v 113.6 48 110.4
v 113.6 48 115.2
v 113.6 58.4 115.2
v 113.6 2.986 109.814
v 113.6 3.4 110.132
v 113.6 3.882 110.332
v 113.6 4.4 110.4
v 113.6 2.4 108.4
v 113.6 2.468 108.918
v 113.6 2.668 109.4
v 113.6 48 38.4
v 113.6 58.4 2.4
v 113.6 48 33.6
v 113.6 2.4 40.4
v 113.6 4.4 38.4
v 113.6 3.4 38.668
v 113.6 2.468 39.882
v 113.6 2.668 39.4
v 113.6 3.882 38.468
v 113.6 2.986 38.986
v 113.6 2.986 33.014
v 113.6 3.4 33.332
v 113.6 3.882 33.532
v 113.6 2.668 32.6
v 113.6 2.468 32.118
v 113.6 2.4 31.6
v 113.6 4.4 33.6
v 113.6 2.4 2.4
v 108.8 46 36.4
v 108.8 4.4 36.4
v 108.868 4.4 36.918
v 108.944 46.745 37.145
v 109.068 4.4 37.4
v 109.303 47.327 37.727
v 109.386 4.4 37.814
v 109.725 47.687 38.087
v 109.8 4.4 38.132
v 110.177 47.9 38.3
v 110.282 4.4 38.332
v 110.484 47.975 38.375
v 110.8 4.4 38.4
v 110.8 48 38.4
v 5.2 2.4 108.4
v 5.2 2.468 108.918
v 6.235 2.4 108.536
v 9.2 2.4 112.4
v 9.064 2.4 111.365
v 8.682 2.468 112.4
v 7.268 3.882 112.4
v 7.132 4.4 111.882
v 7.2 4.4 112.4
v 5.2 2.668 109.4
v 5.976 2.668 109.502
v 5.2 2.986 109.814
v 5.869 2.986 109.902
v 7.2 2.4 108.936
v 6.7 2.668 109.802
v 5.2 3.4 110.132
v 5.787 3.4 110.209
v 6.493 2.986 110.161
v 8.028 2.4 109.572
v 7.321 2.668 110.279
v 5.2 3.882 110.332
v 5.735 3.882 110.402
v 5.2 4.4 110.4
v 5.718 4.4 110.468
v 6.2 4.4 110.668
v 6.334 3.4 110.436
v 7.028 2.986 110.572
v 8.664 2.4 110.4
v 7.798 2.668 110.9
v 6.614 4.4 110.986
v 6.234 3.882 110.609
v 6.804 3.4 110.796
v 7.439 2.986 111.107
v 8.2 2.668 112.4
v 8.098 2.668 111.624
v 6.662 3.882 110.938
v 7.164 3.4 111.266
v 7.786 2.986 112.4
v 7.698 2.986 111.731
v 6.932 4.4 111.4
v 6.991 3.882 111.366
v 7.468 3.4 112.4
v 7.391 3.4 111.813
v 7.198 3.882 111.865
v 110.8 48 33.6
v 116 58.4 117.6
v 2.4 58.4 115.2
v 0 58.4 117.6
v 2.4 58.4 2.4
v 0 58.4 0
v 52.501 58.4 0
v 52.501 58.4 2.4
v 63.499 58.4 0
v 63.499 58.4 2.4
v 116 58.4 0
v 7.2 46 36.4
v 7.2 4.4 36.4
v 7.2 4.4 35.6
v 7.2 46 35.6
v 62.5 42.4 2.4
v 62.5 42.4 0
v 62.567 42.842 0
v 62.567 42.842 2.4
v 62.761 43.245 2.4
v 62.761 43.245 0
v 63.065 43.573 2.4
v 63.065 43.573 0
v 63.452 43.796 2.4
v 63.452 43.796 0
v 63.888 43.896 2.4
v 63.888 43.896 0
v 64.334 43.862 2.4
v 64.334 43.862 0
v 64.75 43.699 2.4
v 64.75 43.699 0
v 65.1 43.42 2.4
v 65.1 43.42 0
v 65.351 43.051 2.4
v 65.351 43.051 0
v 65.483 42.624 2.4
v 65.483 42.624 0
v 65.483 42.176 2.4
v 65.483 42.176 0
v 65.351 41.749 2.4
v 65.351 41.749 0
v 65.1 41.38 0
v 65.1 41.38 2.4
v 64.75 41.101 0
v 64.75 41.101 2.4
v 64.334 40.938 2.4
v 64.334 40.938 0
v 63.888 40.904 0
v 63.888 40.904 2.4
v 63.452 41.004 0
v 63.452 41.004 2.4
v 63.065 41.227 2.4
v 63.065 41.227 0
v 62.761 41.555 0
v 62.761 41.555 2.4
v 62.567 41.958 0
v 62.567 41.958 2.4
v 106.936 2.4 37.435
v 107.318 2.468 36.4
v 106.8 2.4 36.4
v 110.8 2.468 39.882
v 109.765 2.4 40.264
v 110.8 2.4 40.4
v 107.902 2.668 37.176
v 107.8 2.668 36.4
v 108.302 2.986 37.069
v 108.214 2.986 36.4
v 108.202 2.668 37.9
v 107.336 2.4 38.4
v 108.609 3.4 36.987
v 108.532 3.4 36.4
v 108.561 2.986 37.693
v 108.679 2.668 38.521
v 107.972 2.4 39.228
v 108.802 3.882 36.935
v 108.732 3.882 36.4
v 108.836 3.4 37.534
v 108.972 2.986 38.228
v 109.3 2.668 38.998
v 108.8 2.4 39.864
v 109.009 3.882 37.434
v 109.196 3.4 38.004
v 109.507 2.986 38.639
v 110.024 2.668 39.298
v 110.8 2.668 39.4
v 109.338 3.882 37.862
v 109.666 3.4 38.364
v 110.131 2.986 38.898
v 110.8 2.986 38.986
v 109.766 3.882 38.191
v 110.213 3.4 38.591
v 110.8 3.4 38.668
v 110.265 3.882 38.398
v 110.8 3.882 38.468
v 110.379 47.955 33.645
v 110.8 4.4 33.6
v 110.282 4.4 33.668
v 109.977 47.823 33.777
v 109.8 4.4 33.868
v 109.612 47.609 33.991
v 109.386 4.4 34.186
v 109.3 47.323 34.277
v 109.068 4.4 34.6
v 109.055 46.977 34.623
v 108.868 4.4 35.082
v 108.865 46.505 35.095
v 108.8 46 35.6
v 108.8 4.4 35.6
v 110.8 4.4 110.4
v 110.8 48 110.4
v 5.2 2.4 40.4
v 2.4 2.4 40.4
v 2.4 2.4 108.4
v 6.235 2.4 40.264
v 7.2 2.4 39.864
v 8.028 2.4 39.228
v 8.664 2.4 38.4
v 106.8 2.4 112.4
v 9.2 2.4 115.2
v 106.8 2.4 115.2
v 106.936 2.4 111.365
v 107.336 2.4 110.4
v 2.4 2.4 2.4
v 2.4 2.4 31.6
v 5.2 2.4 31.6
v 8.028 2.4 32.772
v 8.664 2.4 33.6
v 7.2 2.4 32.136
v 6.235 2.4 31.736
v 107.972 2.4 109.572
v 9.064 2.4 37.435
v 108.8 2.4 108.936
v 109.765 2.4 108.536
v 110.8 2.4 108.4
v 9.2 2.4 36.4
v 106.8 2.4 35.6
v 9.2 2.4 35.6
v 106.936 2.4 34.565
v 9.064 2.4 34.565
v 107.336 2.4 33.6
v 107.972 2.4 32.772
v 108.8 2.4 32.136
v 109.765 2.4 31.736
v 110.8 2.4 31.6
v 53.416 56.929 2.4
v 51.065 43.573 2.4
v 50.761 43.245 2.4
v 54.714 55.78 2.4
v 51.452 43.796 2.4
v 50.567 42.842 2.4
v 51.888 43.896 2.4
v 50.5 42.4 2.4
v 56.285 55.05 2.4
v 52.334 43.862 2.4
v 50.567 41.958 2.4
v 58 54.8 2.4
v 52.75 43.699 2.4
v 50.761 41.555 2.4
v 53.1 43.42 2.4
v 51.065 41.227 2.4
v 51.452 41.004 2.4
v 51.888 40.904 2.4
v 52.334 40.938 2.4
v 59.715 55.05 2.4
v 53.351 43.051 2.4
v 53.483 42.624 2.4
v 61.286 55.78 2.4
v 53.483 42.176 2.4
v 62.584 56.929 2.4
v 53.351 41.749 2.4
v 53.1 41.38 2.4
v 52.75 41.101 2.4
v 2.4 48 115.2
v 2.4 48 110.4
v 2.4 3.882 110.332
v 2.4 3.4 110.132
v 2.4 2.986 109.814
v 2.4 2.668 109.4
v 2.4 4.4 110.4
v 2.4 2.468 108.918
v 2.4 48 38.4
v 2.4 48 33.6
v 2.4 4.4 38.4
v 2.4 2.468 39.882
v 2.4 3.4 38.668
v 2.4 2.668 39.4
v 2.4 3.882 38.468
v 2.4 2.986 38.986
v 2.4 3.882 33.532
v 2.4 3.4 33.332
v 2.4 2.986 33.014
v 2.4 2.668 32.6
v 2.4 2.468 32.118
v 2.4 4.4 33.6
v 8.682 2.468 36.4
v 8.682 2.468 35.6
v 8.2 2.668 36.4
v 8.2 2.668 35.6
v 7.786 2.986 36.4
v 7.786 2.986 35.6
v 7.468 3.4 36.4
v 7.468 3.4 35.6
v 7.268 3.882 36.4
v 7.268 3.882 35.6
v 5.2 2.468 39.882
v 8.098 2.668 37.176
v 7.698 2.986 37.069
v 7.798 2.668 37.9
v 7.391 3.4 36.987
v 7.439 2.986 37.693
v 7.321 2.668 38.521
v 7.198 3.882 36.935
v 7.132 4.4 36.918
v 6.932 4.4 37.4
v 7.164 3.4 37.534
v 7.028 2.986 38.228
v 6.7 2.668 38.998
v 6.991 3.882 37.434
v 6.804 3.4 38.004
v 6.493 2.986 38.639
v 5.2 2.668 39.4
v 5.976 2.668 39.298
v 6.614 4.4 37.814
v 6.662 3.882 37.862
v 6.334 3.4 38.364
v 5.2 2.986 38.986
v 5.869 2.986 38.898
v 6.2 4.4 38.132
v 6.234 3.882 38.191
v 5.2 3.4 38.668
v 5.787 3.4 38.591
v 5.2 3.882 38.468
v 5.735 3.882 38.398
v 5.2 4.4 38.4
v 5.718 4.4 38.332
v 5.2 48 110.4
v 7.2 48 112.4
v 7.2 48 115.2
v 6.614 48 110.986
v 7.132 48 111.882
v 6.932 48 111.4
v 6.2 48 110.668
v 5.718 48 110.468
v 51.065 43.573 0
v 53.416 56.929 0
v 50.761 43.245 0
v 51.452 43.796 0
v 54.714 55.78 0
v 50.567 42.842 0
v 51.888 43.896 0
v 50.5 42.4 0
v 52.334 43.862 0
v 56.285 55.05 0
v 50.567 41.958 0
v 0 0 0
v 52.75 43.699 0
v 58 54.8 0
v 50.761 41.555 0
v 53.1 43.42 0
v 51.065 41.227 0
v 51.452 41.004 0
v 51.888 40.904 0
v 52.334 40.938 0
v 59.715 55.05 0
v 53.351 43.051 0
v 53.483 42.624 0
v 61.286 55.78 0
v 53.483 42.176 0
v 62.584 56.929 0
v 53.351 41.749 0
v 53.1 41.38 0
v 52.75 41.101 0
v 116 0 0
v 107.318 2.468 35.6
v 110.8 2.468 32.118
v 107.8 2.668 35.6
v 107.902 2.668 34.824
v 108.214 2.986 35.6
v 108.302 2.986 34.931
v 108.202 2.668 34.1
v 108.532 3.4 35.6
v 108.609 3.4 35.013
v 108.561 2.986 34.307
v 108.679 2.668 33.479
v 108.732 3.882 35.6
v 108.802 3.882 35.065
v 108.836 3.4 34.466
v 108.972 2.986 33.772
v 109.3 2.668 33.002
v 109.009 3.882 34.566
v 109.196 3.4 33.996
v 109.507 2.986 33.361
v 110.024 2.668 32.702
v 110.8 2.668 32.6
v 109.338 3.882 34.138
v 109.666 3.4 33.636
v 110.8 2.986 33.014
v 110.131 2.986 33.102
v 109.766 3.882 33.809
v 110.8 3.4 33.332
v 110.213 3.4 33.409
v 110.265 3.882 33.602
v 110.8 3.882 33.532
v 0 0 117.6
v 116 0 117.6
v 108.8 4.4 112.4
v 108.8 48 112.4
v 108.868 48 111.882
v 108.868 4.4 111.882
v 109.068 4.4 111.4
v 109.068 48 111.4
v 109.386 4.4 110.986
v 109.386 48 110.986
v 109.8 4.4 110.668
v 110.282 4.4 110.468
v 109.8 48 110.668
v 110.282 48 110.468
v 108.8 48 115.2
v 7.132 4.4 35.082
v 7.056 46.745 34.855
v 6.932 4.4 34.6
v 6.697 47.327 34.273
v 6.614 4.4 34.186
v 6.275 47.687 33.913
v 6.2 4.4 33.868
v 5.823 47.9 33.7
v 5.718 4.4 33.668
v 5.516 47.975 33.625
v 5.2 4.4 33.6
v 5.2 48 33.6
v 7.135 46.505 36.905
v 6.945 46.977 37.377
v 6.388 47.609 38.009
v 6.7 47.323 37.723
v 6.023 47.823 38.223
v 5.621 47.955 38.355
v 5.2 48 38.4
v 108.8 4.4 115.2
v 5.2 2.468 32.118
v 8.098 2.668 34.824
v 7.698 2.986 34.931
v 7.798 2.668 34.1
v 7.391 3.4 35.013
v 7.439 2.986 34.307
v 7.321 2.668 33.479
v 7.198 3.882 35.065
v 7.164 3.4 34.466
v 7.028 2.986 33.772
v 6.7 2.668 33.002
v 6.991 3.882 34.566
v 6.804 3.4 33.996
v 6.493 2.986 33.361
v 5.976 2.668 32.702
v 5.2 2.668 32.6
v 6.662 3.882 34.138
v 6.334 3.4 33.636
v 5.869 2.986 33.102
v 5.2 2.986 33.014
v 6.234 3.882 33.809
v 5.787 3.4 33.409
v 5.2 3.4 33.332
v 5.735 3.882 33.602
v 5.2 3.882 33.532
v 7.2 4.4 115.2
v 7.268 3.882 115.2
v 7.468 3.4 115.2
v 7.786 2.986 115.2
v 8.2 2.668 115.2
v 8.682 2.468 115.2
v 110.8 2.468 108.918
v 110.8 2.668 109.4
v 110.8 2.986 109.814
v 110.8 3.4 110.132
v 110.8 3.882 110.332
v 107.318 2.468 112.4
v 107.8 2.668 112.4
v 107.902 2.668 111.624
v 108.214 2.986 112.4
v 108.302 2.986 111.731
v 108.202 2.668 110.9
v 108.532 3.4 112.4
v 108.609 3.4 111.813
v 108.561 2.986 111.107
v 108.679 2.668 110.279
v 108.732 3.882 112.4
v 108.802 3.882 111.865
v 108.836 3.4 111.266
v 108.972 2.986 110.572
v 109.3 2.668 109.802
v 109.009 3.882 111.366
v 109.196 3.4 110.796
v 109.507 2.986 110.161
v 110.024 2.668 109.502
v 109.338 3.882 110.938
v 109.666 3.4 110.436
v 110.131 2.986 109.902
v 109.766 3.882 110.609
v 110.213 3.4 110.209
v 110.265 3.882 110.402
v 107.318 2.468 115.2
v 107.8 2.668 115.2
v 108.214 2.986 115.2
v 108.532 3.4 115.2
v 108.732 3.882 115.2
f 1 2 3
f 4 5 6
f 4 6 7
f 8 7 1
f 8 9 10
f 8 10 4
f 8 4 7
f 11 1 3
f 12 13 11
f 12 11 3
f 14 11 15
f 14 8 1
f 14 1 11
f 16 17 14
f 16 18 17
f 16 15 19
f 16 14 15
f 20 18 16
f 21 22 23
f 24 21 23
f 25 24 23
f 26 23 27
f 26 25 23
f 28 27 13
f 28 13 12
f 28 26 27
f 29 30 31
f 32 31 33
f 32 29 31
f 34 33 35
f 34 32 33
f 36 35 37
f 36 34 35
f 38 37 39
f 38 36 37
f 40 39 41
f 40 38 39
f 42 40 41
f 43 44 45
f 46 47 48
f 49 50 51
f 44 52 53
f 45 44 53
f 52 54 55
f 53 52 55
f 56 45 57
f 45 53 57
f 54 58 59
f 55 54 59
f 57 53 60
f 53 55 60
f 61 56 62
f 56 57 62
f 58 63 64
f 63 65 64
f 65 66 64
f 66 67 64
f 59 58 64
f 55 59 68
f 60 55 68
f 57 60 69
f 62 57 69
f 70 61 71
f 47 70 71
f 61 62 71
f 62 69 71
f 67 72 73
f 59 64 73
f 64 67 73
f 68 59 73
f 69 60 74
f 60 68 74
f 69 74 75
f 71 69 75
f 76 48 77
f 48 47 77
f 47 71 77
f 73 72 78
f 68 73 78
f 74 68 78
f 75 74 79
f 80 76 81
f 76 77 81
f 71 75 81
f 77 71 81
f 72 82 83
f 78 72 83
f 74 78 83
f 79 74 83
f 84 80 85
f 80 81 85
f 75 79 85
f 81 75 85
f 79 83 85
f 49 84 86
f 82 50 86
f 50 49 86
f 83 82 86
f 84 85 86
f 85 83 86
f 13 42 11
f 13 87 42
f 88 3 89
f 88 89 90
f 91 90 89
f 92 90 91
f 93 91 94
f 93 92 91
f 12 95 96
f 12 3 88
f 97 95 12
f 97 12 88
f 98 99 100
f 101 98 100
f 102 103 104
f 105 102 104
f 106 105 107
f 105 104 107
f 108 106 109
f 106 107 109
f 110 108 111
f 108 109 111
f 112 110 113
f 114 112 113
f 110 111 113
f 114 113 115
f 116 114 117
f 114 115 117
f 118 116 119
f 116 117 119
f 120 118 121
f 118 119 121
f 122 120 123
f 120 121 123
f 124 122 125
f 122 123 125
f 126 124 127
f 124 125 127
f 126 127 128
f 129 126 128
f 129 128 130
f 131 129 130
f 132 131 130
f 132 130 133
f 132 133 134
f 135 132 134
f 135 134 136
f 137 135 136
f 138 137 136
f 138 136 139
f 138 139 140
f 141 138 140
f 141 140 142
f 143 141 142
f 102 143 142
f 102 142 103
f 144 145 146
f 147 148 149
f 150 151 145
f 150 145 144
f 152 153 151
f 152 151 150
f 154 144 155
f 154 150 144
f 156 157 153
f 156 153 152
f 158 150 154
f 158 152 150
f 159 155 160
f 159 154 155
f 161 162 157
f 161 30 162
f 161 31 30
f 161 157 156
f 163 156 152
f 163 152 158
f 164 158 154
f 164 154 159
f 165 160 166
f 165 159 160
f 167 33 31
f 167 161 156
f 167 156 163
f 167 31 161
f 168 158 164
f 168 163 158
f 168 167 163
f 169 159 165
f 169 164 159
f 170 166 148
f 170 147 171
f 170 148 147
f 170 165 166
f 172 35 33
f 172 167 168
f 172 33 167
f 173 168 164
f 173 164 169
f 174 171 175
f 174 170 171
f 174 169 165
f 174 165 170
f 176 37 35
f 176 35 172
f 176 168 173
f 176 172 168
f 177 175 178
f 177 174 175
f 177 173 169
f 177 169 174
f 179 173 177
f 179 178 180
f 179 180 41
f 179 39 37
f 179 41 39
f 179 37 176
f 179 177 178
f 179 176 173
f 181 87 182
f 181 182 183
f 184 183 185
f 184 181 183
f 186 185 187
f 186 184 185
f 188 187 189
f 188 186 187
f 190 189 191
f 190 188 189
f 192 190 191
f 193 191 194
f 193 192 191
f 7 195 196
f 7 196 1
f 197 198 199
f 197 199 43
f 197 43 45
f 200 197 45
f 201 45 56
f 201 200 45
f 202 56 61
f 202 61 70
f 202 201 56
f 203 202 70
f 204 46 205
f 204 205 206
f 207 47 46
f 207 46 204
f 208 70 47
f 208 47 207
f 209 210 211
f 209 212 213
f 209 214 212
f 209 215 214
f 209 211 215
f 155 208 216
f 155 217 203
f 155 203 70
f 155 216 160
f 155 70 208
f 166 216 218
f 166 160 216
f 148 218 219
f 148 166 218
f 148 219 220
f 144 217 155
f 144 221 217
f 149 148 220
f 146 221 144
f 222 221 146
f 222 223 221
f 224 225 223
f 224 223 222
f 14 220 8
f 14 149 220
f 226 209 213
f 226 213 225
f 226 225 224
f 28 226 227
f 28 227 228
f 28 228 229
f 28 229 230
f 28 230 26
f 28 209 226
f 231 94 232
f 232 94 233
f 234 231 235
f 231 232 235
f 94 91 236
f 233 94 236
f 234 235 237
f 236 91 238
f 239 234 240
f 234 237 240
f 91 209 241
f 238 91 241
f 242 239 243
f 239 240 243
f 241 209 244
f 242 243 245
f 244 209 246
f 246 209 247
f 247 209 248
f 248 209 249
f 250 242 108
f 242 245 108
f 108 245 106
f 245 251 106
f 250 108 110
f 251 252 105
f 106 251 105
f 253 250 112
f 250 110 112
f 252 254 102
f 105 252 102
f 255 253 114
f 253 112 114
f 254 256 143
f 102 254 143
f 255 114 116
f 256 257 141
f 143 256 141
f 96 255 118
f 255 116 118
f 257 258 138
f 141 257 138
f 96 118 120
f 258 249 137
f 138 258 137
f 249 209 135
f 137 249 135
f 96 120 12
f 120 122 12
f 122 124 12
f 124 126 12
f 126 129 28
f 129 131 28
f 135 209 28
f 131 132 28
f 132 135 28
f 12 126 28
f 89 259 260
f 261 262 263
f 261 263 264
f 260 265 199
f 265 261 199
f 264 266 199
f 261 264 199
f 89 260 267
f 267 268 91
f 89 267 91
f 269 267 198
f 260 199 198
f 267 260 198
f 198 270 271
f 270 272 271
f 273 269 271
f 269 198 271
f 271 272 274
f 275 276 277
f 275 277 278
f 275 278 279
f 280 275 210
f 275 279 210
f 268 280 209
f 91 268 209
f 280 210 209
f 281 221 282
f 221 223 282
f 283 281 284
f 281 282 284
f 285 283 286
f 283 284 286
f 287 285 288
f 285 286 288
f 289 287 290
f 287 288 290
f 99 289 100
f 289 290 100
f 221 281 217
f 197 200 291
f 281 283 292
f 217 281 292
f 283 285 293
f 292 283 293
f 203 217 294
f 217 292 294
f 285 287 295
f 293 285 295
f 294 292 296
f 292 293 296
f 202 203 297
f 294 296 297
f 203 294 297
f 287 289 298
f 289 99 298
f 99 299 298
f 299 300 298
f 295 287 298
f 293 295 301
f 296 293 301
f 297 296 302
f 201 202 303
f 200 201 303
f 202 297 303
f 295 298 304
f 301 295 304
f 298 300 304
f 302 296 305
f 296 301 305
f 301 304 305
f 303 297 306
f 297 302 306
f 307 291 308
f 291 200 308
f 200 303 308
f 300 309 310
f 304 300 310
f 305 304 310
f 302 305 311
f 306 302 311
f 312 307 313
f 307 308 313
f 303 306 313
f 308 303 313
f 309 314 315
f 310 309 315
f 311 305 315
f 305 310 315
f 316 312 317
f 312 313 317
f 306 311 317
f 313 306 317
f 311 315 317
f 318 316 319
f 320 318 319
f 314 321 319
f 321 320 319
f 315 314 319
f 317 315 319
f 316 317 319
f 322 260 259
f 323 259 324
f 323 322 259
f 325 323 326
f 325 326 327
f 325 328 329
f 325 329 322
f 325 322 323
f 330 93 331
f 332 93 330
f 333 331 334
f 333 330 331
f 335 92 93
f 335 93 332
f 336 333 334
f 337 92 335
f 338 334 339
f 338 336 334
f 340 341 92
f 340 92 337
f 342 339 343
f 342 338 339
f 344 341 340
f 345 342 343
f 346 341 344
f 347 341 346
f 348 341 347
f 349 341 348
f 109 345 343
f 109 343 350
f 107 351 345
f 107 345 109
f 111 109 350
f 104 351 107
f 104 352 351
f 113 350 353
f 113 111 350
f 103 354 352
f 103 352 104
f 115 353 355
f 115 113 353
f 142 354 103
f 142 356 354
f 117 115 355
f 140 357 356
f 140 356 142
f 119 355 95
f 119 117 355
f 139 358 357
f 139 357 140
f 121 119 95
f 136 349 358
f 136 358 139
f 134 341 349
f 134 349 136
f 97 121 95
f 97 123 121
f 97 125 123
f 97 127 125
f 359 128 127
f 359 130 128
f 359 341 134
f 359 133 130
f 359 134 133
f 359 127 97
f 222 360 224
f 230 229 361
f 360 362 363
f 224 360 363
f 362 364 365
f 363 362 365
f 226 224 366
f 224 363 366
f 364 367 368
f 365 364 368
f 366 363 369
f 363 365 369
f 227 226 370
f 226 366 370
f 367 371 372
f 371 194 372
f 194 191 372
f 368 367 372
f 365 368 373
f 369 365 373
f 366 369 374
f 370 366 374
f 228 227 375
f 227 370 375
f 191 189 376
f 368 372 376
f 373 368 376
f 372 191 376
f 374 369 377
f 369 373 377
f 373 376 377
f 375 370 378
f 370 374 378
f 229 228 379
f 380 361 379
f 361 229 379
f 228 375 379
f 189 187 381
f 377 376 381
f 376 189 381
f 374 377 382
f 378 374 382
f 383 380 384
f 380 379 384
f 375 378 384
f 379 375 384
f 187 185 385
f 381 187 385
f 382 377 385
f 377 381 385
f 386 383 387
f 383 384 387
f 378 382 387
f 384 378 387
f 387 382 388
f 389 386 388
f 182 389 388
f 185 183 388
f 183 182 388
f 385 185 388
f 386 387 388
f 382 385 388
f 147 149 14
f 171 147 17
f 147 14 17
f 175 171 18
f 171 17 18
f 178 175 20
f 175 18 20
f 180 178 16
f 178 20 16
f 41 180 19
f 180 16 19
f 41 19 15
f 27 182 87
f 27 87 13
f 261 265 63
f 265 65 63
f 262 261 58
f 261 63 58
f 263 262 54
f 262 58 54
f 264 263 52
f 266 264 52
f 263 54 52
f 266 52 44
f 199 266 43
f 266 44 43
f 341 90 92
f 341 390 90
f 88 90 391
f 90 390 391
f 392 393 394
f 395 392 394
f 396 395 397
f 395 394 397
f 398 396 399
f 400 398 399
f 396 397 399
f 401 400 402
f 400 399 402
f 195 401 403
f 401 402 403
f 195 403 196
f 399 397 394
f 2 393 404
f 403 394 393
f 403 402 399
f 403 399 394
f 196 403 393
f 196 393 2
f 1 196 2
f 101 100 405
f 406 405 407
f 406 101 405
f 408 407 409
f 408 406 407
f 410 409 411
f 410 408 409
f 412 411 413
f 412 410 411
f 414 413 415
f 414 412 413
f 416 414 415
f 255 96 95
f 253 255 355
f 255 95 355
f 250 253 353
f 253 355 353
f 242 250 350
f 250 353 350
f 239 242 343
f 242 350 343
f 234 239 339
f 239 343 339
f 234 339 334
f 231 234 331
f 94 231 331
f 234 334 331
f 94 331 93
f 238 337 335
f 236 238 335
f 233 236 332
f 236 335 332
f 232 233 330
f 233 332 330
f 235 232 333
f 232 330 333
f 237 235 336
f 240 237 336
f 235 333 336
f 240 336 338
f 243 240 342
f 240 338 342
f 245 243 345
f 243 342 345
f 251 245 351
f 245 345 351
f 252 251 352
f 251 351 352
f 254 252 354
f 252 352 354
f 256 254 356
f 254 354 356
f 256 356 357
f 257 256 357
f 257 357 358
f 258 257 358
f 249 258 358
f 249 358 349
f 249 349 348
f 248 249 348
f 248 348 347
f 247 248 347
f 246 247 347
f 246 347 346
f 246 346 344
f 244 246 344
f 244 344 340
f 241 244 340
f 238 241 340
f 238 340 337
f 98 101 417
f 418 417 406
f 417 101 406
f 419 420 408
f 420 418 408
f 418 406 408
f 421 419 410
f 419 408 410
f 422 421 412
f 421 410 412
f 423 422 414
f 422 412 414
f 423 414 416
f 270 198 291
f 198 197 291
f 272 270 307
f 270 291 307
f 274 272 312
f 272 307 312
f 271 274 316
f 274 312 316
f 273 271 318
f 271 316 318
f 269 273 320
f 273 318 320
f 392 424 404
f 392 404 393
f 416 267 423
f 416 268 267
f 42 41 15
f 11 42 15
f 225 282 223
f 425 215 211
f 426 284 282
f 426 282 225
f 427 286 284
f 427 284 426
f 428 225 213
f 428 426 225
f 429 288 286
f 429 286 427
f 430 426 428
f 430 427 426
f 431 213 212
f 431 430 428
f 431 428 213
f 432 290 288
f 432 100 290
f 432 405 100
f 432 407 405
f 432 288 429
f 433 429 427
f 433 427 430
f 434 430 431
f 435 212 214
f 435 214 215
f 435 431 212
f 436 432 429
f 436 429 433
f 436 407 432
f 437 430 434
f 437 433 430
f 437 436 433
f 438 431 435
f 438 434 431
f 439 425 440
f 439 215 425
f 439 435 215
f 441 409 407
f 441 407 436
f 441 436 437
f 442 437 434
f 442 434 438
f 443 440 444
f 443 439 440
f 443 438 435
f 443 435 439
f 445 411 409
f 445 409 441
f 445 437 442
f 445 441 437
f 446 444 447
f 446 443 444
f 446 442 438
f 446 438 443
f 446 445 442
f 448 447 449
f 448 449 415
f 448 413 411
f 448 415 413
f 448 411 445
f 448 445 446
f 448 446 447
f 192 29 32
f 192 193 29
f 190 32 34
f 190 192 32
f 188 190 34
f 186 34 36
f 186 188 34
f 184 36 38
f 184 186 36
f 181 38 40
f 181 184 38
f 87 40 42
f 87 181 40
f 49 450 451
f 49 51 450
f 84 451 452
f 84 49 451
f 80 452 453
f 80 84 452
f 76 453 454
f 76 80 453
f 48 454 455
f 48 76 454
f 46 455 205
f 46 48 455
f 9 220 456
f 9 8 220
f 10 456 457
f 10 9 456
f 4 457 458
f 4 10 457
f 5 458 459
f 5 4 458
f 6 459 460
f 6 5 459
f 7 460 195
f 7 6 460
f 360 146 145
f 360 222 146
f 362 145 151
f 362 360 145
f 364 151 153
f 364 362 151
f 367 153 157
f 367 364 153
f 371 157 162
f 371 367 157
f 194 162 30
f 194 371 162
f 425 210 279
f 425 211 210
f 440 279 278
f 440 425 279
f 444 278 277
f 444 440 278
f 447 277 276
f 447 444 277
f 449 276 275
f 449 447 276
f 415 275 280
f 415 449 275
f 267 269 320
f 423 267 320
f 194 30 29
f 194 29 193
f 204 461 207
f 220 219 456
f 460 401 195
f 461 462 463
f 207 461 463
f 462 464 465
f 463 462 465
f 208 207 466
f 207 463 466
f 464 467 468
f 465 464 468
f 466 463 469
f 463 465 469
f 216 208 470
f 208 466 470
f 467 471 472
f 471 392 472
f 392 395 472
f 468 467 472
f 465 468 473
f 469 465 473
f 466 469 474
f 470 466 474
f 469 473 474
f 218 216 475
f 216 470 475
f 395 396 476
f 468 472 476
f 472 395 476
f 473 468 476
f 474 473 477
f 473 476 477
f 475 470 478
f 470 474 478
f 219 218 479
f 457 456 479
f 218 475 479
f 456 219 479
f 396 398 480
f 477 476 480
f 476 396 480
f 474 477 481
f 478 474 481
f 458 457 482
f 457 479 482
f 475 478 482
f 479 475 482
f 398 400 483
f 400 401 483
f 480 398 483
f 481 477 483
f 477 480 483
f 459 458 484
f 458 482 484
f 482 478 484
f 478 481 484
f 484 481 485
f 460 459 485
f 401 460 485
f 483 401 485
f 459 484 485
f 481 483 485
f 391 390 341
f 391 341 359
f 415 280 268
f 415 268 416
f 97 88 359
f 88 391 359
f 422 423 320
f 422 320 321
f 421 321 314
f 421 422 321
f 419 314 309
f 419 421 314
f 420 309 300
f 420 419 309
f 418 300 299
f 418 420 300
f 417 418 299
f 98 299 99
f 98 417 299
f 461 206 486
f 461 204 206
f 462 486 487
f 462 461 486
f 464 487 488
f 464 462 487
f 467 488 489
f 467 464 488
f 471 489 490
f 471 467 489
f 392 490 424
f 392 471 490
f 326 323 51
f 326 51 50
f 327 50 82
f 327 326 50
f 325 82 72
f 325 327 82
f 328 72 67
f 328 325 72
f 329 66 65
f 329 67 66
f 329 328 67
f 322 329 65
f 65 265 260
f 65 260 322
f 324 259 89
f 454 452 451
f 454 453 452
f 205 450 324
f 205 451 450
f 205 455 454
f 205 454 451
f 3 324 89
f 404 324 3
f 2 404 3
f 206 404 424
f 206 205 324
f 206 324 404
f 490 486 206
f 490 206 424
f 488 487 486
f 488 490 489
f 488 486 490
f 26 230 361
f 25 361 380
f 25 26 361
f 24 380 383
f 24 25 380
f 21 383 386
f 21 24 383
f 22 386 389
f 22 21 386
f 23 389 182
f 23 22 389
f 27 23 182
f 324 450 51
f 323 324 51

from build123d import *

# Parameters (mm, degrees)
SKETCH1_W           = 116
SKETCH1_H           = 117.6
BOSS_EXTRUDE1_DEPTH = 2.4
SKETCH2_W           = 116
SKETCH2_H           = 117.6
SKETCH2_W_2         = 111.2
SKETCH2_H_2         = 112.8
BOSS_EXTRUDE2_DEPTH = 56
SKETCH3_R           = 1.5
CUT_EXTRUDE1_DEPTH  = 10
SKETCH7_W           = 4.8
SKETCH7_H           = 4.8
BOSS_EXTRUDE4_DEPTH = 45.6
FILLET2_R           = 2
SKETCH8_R           = 6
CUT_EXTRUDE2_DEPTH  = 10


with BuildPart() as part:
    # Sketch1 → Boss-Extrude1 (new body)
    with BuildSketch(Plane(origin=(0, 0, 0), x_dir=(1, 0, 0), z_dir=(0, 1, 0))):
        with Locations((58, -58.8)):
            Rectangle(SKETCH1_W, SKETCH1_H)
    extrude(amount=BOSS_EXTRUDE1_DEPTH)

    # Sketch2 → Boss-Extrude2 (add)
    with BuildSketch(Plane(origin=(0, 2.4, 0), x_dir=(1, 0, 0), z_dir=(0, 1, 0))):
        with Locations((58, -58.8)):
            Rectangle(SKETCH2_W, SKETCH2_H)
        with Locations((58, -58.8)):
            Rectangle(SKETCH2_W_2, SKETCH2_H_2, mode=Mode.SUBTRACT)
    extrude(amount=BOSS_EXTRUDE2_DEPTH)

    # Sketch3 → Cut-Extrude1 (cut)
    with BuildSketch(Plane(origin=(0, 0, 0), x_dir=(-1, 0, 0), z_dir=(0, 0, -1))):
        with Locations((-64, 42.4)):
            Circle(SKETCH3_R)
        with Locations((-52, 42.4)):
            Circle(SKETCH3_R)
    extrude(amount=-CUT_EXTRUDE1_DEPTH, mode=Mode.SUBTRACT)

    # Sketch7 → Boss-Extrude4 (add)
    with BuildSketch(Plane(origin=(0, 2.4, 0), x_dir=(1, 0, 0), z_dir=(0, 1, 0))):
        with Locations((4.8, -112.8)):
            Rectangle(SKETCH7_W, SKETCH7_H)
        with Locations((4.8, -36)):
            Rectangle(SKETCH7_W, SKETCH7_H)
        with Locations((111.2, -112.8)):
            Rectangle(SKETCH7_W, SKETCH7_H)
        with Locations((111.2, -36)):
            Rectangle(SKETCH7_W, SKETCH7_H)
    extrude(amount=BOSS_EXTRUDE4_DEPTH)

    # Fillet2
    fillet2_edges = [part.edges().sort_by_distance(p)[0] for p in [
        (4.8, 2.4, 38.4),
        (4.8, 2.4, 33.6),
        (111.2, 2.4, 33.6),
        (111.2, 2.4, 38.4),
        (7.2, 25.2, 38.4),
        (7.2, 48, 36),
        (7.2, 25.2, 33.6),
        (7.2, 2.4, 36),
        (108.8, 25.2, 33.6),
        (108.8, 48, 36),
        (108.8, 25.2, 38.4),
        (108.8, 2.4, 36),
        (7.2, 25.2, 110.4),
        (108.8, 25.2, 110.4),
        (4.8, 2.4, 110.4),
        (7.2, 2.4, 112.8),
        (108.8, 2.4, 112.8),
        (111.2, 2.4, 110.4),
    ]]
    fillet(fillet2_edges, radius=FILLET2_R)

    # Sketch8 → Cut-Extrude2 (cut)
    with BuildSketch(Plane(origin=(0, 0, 0), x_dir=(-1, 0, 0), z_dir=(0, 0, -1))):
        with Locations((-58, 60.8)):
            Circle(SKETCH8_R)
    extrude(amount=-CUT_EXTRUDE2_DEPTH, mode=Mode.SUBTRACT)


solid = part.part
